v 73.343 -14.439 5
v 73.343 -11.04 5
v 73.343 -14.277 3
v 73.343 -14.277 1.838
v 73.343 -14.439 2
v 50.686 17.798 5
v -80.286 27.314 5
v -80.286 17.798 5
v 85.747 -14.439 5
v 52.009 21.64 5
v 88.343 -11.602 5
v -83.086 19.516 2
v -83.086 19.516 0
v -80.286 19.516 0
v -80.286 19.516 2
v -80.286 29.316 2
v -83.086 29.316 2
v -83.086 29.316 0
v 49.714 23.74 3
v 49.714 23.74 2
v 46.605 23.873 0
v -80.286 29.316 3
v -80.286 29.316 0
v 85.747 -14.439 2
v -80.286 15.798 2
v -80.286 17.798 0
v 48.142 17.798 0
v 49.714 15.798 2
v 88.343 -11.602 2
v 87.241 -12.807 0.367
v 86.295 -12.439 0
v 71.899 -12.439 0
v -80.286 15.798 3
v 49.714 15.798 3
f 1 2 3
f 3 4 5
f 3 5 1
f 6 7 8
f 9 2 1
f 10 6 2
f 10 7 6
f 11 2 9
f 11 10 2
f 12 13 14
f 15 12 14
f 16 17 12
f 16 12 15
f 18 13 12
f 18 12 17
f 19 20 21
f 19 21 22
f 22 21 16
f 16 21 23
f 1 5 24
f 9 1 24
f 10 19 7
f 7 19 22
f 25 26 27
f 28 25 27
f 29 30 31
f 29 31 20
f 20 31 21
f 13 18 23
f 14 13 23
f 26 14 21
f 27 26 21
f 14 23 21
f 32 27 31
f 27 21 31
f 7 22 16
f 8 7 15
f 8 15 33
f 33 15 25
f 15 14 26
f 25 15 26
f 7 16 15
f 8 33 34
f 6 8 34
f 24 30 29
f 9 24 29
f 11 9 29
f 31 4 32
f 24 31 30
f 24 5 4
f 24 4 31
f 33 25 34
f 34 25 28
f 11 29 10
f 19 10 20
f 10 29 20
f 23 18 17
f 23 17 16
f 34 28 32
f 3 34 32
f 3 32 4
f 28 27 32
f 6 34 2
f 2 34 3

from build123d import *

# Parameters (mm, degrees)
F1_DEPTH = 5
F2_SIZE  = 2
F0_W     = 2.8
F0_H     = 9.8
F3_DEPTH = 2


# Not quite as in the source:
# - a feature of the source that left no trace in its solid (it failed there, or was rolled back) is left out


with BuildPart() as f1:
    # F0 (on Top) → F1 (new body)
    with BuildSketch(Plane.XY):
        Polygon((49.7136654785, 23.7398390386), (-80.2863345215, 29.3157004521), (-80.2863345215, 19.5157004521), (-80.2863345215, 15.7984595098), (49.7136654785, 15.7984595098), (73.3425258757, -14.2773987355), (73.3425258757, -14.4394316876), (85.7469019117, -14.4394316876), (88.3425258757, -11.6024324968), align=None)
    extrude(amount=F1_DEPTH)

    # F2 (call 1 of 5: OpenCascade refuses the feature's edges together)
    f2_edges = [f1.edges().sort_by_distance(p)[0] for p in [
        (-15.286335, 15.79846, 0),
    ]]
    chamfer(f2_edges, length=F2_SIZE)

    # F2#2 (call 2 of 5)
    f2_2_edges = [f1.edges().sort_by_distance(p)[0] for p in [
        (69.028096, 6.068703, 0),
    ]]
    chamfer(f2_2_edges, length=F2_SIZE)

    # F2#3 (call 3 of 5)
    f2_3_edges = [f1.edges().sort_by_distance(p)[0] for p in [
        (79.544714, -14.439432, 0),
    ]]
    chamfer(f2_3_edges, length=F2_SIZE)

    # F2#4 (call 4 of 5)
    f2_4_edges = [f1.edges().sort_by_distance(p)[0] for p in [
        (61.528096, 0.76053, 5),
        (-15.286335, 15.79846, 5),
    ]]
    chamfer(f2_4_edges, length=F2_SIZE)

    # F2#5 (call 5 of 5)
    f2_5_edges = [f1.edges().sort_by_distance(p)[0] for p in [
        (-15.286335, 26.52777, 5),
    ]]
    chamfer(f2_5_edges, length=F2_SIZE)

    # F0 (on Top) → F3 (join)
    with BuildSketch(Plane.XY):
        with Locations((-81.6863345215, 24.4157004521)):
            Rectangle(F0_W, F0_H)
    extrude(amount=F3_DEPTH)


solid = f1.part
